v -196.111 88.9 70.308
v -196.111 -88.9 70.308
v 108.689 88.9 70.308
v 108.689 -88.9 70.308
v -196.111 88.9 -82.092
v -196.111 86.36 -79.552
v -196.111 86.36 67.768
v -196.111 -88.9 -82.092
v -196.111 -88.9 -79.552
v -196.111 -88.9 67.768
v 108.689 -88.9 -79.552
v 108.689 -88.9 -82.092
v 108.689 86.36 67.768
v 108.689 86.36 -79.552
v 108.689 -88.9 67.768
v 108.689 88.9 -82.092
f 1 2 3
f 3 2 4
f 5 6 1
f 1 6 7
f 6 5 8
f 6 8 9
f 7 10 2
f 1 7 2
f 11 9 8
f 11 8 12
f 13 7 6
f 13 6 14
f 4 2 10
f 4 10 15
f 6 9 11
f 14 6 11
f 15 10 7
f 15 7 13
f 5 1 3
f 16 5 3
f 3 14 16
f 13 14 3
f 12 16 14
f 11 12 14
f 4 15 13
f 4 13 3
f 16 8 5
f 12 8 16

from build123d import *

# Parameters (mm, degrees)
F0_W     = 304.8
F0_H     = 152.4
F1_DEPTH = 88.9
F2_T     = -2.54


with BuildPart() as f1:
    # F0 (on Front) → F1 (new body, symmetric)
    with BuildSketch(Plane.XZ):
        with Locations((-43.711439, -5.892325)):
            Rectangle(F0_W, F0_H)
    extrude(amount=F1_DEPTH, both=True)

    # F2
    f2_openings = [f1.faces().sort_by_distance(p)[0] for p in [
        (-43.711439, -88.9, -5.892325),
        (-196.111439, 0, -5.892325),
        (108.688561, 0, -5.892325),
    ]]
    offset(amount=F2_T, openings=f2_openings)


solid = f1.part
